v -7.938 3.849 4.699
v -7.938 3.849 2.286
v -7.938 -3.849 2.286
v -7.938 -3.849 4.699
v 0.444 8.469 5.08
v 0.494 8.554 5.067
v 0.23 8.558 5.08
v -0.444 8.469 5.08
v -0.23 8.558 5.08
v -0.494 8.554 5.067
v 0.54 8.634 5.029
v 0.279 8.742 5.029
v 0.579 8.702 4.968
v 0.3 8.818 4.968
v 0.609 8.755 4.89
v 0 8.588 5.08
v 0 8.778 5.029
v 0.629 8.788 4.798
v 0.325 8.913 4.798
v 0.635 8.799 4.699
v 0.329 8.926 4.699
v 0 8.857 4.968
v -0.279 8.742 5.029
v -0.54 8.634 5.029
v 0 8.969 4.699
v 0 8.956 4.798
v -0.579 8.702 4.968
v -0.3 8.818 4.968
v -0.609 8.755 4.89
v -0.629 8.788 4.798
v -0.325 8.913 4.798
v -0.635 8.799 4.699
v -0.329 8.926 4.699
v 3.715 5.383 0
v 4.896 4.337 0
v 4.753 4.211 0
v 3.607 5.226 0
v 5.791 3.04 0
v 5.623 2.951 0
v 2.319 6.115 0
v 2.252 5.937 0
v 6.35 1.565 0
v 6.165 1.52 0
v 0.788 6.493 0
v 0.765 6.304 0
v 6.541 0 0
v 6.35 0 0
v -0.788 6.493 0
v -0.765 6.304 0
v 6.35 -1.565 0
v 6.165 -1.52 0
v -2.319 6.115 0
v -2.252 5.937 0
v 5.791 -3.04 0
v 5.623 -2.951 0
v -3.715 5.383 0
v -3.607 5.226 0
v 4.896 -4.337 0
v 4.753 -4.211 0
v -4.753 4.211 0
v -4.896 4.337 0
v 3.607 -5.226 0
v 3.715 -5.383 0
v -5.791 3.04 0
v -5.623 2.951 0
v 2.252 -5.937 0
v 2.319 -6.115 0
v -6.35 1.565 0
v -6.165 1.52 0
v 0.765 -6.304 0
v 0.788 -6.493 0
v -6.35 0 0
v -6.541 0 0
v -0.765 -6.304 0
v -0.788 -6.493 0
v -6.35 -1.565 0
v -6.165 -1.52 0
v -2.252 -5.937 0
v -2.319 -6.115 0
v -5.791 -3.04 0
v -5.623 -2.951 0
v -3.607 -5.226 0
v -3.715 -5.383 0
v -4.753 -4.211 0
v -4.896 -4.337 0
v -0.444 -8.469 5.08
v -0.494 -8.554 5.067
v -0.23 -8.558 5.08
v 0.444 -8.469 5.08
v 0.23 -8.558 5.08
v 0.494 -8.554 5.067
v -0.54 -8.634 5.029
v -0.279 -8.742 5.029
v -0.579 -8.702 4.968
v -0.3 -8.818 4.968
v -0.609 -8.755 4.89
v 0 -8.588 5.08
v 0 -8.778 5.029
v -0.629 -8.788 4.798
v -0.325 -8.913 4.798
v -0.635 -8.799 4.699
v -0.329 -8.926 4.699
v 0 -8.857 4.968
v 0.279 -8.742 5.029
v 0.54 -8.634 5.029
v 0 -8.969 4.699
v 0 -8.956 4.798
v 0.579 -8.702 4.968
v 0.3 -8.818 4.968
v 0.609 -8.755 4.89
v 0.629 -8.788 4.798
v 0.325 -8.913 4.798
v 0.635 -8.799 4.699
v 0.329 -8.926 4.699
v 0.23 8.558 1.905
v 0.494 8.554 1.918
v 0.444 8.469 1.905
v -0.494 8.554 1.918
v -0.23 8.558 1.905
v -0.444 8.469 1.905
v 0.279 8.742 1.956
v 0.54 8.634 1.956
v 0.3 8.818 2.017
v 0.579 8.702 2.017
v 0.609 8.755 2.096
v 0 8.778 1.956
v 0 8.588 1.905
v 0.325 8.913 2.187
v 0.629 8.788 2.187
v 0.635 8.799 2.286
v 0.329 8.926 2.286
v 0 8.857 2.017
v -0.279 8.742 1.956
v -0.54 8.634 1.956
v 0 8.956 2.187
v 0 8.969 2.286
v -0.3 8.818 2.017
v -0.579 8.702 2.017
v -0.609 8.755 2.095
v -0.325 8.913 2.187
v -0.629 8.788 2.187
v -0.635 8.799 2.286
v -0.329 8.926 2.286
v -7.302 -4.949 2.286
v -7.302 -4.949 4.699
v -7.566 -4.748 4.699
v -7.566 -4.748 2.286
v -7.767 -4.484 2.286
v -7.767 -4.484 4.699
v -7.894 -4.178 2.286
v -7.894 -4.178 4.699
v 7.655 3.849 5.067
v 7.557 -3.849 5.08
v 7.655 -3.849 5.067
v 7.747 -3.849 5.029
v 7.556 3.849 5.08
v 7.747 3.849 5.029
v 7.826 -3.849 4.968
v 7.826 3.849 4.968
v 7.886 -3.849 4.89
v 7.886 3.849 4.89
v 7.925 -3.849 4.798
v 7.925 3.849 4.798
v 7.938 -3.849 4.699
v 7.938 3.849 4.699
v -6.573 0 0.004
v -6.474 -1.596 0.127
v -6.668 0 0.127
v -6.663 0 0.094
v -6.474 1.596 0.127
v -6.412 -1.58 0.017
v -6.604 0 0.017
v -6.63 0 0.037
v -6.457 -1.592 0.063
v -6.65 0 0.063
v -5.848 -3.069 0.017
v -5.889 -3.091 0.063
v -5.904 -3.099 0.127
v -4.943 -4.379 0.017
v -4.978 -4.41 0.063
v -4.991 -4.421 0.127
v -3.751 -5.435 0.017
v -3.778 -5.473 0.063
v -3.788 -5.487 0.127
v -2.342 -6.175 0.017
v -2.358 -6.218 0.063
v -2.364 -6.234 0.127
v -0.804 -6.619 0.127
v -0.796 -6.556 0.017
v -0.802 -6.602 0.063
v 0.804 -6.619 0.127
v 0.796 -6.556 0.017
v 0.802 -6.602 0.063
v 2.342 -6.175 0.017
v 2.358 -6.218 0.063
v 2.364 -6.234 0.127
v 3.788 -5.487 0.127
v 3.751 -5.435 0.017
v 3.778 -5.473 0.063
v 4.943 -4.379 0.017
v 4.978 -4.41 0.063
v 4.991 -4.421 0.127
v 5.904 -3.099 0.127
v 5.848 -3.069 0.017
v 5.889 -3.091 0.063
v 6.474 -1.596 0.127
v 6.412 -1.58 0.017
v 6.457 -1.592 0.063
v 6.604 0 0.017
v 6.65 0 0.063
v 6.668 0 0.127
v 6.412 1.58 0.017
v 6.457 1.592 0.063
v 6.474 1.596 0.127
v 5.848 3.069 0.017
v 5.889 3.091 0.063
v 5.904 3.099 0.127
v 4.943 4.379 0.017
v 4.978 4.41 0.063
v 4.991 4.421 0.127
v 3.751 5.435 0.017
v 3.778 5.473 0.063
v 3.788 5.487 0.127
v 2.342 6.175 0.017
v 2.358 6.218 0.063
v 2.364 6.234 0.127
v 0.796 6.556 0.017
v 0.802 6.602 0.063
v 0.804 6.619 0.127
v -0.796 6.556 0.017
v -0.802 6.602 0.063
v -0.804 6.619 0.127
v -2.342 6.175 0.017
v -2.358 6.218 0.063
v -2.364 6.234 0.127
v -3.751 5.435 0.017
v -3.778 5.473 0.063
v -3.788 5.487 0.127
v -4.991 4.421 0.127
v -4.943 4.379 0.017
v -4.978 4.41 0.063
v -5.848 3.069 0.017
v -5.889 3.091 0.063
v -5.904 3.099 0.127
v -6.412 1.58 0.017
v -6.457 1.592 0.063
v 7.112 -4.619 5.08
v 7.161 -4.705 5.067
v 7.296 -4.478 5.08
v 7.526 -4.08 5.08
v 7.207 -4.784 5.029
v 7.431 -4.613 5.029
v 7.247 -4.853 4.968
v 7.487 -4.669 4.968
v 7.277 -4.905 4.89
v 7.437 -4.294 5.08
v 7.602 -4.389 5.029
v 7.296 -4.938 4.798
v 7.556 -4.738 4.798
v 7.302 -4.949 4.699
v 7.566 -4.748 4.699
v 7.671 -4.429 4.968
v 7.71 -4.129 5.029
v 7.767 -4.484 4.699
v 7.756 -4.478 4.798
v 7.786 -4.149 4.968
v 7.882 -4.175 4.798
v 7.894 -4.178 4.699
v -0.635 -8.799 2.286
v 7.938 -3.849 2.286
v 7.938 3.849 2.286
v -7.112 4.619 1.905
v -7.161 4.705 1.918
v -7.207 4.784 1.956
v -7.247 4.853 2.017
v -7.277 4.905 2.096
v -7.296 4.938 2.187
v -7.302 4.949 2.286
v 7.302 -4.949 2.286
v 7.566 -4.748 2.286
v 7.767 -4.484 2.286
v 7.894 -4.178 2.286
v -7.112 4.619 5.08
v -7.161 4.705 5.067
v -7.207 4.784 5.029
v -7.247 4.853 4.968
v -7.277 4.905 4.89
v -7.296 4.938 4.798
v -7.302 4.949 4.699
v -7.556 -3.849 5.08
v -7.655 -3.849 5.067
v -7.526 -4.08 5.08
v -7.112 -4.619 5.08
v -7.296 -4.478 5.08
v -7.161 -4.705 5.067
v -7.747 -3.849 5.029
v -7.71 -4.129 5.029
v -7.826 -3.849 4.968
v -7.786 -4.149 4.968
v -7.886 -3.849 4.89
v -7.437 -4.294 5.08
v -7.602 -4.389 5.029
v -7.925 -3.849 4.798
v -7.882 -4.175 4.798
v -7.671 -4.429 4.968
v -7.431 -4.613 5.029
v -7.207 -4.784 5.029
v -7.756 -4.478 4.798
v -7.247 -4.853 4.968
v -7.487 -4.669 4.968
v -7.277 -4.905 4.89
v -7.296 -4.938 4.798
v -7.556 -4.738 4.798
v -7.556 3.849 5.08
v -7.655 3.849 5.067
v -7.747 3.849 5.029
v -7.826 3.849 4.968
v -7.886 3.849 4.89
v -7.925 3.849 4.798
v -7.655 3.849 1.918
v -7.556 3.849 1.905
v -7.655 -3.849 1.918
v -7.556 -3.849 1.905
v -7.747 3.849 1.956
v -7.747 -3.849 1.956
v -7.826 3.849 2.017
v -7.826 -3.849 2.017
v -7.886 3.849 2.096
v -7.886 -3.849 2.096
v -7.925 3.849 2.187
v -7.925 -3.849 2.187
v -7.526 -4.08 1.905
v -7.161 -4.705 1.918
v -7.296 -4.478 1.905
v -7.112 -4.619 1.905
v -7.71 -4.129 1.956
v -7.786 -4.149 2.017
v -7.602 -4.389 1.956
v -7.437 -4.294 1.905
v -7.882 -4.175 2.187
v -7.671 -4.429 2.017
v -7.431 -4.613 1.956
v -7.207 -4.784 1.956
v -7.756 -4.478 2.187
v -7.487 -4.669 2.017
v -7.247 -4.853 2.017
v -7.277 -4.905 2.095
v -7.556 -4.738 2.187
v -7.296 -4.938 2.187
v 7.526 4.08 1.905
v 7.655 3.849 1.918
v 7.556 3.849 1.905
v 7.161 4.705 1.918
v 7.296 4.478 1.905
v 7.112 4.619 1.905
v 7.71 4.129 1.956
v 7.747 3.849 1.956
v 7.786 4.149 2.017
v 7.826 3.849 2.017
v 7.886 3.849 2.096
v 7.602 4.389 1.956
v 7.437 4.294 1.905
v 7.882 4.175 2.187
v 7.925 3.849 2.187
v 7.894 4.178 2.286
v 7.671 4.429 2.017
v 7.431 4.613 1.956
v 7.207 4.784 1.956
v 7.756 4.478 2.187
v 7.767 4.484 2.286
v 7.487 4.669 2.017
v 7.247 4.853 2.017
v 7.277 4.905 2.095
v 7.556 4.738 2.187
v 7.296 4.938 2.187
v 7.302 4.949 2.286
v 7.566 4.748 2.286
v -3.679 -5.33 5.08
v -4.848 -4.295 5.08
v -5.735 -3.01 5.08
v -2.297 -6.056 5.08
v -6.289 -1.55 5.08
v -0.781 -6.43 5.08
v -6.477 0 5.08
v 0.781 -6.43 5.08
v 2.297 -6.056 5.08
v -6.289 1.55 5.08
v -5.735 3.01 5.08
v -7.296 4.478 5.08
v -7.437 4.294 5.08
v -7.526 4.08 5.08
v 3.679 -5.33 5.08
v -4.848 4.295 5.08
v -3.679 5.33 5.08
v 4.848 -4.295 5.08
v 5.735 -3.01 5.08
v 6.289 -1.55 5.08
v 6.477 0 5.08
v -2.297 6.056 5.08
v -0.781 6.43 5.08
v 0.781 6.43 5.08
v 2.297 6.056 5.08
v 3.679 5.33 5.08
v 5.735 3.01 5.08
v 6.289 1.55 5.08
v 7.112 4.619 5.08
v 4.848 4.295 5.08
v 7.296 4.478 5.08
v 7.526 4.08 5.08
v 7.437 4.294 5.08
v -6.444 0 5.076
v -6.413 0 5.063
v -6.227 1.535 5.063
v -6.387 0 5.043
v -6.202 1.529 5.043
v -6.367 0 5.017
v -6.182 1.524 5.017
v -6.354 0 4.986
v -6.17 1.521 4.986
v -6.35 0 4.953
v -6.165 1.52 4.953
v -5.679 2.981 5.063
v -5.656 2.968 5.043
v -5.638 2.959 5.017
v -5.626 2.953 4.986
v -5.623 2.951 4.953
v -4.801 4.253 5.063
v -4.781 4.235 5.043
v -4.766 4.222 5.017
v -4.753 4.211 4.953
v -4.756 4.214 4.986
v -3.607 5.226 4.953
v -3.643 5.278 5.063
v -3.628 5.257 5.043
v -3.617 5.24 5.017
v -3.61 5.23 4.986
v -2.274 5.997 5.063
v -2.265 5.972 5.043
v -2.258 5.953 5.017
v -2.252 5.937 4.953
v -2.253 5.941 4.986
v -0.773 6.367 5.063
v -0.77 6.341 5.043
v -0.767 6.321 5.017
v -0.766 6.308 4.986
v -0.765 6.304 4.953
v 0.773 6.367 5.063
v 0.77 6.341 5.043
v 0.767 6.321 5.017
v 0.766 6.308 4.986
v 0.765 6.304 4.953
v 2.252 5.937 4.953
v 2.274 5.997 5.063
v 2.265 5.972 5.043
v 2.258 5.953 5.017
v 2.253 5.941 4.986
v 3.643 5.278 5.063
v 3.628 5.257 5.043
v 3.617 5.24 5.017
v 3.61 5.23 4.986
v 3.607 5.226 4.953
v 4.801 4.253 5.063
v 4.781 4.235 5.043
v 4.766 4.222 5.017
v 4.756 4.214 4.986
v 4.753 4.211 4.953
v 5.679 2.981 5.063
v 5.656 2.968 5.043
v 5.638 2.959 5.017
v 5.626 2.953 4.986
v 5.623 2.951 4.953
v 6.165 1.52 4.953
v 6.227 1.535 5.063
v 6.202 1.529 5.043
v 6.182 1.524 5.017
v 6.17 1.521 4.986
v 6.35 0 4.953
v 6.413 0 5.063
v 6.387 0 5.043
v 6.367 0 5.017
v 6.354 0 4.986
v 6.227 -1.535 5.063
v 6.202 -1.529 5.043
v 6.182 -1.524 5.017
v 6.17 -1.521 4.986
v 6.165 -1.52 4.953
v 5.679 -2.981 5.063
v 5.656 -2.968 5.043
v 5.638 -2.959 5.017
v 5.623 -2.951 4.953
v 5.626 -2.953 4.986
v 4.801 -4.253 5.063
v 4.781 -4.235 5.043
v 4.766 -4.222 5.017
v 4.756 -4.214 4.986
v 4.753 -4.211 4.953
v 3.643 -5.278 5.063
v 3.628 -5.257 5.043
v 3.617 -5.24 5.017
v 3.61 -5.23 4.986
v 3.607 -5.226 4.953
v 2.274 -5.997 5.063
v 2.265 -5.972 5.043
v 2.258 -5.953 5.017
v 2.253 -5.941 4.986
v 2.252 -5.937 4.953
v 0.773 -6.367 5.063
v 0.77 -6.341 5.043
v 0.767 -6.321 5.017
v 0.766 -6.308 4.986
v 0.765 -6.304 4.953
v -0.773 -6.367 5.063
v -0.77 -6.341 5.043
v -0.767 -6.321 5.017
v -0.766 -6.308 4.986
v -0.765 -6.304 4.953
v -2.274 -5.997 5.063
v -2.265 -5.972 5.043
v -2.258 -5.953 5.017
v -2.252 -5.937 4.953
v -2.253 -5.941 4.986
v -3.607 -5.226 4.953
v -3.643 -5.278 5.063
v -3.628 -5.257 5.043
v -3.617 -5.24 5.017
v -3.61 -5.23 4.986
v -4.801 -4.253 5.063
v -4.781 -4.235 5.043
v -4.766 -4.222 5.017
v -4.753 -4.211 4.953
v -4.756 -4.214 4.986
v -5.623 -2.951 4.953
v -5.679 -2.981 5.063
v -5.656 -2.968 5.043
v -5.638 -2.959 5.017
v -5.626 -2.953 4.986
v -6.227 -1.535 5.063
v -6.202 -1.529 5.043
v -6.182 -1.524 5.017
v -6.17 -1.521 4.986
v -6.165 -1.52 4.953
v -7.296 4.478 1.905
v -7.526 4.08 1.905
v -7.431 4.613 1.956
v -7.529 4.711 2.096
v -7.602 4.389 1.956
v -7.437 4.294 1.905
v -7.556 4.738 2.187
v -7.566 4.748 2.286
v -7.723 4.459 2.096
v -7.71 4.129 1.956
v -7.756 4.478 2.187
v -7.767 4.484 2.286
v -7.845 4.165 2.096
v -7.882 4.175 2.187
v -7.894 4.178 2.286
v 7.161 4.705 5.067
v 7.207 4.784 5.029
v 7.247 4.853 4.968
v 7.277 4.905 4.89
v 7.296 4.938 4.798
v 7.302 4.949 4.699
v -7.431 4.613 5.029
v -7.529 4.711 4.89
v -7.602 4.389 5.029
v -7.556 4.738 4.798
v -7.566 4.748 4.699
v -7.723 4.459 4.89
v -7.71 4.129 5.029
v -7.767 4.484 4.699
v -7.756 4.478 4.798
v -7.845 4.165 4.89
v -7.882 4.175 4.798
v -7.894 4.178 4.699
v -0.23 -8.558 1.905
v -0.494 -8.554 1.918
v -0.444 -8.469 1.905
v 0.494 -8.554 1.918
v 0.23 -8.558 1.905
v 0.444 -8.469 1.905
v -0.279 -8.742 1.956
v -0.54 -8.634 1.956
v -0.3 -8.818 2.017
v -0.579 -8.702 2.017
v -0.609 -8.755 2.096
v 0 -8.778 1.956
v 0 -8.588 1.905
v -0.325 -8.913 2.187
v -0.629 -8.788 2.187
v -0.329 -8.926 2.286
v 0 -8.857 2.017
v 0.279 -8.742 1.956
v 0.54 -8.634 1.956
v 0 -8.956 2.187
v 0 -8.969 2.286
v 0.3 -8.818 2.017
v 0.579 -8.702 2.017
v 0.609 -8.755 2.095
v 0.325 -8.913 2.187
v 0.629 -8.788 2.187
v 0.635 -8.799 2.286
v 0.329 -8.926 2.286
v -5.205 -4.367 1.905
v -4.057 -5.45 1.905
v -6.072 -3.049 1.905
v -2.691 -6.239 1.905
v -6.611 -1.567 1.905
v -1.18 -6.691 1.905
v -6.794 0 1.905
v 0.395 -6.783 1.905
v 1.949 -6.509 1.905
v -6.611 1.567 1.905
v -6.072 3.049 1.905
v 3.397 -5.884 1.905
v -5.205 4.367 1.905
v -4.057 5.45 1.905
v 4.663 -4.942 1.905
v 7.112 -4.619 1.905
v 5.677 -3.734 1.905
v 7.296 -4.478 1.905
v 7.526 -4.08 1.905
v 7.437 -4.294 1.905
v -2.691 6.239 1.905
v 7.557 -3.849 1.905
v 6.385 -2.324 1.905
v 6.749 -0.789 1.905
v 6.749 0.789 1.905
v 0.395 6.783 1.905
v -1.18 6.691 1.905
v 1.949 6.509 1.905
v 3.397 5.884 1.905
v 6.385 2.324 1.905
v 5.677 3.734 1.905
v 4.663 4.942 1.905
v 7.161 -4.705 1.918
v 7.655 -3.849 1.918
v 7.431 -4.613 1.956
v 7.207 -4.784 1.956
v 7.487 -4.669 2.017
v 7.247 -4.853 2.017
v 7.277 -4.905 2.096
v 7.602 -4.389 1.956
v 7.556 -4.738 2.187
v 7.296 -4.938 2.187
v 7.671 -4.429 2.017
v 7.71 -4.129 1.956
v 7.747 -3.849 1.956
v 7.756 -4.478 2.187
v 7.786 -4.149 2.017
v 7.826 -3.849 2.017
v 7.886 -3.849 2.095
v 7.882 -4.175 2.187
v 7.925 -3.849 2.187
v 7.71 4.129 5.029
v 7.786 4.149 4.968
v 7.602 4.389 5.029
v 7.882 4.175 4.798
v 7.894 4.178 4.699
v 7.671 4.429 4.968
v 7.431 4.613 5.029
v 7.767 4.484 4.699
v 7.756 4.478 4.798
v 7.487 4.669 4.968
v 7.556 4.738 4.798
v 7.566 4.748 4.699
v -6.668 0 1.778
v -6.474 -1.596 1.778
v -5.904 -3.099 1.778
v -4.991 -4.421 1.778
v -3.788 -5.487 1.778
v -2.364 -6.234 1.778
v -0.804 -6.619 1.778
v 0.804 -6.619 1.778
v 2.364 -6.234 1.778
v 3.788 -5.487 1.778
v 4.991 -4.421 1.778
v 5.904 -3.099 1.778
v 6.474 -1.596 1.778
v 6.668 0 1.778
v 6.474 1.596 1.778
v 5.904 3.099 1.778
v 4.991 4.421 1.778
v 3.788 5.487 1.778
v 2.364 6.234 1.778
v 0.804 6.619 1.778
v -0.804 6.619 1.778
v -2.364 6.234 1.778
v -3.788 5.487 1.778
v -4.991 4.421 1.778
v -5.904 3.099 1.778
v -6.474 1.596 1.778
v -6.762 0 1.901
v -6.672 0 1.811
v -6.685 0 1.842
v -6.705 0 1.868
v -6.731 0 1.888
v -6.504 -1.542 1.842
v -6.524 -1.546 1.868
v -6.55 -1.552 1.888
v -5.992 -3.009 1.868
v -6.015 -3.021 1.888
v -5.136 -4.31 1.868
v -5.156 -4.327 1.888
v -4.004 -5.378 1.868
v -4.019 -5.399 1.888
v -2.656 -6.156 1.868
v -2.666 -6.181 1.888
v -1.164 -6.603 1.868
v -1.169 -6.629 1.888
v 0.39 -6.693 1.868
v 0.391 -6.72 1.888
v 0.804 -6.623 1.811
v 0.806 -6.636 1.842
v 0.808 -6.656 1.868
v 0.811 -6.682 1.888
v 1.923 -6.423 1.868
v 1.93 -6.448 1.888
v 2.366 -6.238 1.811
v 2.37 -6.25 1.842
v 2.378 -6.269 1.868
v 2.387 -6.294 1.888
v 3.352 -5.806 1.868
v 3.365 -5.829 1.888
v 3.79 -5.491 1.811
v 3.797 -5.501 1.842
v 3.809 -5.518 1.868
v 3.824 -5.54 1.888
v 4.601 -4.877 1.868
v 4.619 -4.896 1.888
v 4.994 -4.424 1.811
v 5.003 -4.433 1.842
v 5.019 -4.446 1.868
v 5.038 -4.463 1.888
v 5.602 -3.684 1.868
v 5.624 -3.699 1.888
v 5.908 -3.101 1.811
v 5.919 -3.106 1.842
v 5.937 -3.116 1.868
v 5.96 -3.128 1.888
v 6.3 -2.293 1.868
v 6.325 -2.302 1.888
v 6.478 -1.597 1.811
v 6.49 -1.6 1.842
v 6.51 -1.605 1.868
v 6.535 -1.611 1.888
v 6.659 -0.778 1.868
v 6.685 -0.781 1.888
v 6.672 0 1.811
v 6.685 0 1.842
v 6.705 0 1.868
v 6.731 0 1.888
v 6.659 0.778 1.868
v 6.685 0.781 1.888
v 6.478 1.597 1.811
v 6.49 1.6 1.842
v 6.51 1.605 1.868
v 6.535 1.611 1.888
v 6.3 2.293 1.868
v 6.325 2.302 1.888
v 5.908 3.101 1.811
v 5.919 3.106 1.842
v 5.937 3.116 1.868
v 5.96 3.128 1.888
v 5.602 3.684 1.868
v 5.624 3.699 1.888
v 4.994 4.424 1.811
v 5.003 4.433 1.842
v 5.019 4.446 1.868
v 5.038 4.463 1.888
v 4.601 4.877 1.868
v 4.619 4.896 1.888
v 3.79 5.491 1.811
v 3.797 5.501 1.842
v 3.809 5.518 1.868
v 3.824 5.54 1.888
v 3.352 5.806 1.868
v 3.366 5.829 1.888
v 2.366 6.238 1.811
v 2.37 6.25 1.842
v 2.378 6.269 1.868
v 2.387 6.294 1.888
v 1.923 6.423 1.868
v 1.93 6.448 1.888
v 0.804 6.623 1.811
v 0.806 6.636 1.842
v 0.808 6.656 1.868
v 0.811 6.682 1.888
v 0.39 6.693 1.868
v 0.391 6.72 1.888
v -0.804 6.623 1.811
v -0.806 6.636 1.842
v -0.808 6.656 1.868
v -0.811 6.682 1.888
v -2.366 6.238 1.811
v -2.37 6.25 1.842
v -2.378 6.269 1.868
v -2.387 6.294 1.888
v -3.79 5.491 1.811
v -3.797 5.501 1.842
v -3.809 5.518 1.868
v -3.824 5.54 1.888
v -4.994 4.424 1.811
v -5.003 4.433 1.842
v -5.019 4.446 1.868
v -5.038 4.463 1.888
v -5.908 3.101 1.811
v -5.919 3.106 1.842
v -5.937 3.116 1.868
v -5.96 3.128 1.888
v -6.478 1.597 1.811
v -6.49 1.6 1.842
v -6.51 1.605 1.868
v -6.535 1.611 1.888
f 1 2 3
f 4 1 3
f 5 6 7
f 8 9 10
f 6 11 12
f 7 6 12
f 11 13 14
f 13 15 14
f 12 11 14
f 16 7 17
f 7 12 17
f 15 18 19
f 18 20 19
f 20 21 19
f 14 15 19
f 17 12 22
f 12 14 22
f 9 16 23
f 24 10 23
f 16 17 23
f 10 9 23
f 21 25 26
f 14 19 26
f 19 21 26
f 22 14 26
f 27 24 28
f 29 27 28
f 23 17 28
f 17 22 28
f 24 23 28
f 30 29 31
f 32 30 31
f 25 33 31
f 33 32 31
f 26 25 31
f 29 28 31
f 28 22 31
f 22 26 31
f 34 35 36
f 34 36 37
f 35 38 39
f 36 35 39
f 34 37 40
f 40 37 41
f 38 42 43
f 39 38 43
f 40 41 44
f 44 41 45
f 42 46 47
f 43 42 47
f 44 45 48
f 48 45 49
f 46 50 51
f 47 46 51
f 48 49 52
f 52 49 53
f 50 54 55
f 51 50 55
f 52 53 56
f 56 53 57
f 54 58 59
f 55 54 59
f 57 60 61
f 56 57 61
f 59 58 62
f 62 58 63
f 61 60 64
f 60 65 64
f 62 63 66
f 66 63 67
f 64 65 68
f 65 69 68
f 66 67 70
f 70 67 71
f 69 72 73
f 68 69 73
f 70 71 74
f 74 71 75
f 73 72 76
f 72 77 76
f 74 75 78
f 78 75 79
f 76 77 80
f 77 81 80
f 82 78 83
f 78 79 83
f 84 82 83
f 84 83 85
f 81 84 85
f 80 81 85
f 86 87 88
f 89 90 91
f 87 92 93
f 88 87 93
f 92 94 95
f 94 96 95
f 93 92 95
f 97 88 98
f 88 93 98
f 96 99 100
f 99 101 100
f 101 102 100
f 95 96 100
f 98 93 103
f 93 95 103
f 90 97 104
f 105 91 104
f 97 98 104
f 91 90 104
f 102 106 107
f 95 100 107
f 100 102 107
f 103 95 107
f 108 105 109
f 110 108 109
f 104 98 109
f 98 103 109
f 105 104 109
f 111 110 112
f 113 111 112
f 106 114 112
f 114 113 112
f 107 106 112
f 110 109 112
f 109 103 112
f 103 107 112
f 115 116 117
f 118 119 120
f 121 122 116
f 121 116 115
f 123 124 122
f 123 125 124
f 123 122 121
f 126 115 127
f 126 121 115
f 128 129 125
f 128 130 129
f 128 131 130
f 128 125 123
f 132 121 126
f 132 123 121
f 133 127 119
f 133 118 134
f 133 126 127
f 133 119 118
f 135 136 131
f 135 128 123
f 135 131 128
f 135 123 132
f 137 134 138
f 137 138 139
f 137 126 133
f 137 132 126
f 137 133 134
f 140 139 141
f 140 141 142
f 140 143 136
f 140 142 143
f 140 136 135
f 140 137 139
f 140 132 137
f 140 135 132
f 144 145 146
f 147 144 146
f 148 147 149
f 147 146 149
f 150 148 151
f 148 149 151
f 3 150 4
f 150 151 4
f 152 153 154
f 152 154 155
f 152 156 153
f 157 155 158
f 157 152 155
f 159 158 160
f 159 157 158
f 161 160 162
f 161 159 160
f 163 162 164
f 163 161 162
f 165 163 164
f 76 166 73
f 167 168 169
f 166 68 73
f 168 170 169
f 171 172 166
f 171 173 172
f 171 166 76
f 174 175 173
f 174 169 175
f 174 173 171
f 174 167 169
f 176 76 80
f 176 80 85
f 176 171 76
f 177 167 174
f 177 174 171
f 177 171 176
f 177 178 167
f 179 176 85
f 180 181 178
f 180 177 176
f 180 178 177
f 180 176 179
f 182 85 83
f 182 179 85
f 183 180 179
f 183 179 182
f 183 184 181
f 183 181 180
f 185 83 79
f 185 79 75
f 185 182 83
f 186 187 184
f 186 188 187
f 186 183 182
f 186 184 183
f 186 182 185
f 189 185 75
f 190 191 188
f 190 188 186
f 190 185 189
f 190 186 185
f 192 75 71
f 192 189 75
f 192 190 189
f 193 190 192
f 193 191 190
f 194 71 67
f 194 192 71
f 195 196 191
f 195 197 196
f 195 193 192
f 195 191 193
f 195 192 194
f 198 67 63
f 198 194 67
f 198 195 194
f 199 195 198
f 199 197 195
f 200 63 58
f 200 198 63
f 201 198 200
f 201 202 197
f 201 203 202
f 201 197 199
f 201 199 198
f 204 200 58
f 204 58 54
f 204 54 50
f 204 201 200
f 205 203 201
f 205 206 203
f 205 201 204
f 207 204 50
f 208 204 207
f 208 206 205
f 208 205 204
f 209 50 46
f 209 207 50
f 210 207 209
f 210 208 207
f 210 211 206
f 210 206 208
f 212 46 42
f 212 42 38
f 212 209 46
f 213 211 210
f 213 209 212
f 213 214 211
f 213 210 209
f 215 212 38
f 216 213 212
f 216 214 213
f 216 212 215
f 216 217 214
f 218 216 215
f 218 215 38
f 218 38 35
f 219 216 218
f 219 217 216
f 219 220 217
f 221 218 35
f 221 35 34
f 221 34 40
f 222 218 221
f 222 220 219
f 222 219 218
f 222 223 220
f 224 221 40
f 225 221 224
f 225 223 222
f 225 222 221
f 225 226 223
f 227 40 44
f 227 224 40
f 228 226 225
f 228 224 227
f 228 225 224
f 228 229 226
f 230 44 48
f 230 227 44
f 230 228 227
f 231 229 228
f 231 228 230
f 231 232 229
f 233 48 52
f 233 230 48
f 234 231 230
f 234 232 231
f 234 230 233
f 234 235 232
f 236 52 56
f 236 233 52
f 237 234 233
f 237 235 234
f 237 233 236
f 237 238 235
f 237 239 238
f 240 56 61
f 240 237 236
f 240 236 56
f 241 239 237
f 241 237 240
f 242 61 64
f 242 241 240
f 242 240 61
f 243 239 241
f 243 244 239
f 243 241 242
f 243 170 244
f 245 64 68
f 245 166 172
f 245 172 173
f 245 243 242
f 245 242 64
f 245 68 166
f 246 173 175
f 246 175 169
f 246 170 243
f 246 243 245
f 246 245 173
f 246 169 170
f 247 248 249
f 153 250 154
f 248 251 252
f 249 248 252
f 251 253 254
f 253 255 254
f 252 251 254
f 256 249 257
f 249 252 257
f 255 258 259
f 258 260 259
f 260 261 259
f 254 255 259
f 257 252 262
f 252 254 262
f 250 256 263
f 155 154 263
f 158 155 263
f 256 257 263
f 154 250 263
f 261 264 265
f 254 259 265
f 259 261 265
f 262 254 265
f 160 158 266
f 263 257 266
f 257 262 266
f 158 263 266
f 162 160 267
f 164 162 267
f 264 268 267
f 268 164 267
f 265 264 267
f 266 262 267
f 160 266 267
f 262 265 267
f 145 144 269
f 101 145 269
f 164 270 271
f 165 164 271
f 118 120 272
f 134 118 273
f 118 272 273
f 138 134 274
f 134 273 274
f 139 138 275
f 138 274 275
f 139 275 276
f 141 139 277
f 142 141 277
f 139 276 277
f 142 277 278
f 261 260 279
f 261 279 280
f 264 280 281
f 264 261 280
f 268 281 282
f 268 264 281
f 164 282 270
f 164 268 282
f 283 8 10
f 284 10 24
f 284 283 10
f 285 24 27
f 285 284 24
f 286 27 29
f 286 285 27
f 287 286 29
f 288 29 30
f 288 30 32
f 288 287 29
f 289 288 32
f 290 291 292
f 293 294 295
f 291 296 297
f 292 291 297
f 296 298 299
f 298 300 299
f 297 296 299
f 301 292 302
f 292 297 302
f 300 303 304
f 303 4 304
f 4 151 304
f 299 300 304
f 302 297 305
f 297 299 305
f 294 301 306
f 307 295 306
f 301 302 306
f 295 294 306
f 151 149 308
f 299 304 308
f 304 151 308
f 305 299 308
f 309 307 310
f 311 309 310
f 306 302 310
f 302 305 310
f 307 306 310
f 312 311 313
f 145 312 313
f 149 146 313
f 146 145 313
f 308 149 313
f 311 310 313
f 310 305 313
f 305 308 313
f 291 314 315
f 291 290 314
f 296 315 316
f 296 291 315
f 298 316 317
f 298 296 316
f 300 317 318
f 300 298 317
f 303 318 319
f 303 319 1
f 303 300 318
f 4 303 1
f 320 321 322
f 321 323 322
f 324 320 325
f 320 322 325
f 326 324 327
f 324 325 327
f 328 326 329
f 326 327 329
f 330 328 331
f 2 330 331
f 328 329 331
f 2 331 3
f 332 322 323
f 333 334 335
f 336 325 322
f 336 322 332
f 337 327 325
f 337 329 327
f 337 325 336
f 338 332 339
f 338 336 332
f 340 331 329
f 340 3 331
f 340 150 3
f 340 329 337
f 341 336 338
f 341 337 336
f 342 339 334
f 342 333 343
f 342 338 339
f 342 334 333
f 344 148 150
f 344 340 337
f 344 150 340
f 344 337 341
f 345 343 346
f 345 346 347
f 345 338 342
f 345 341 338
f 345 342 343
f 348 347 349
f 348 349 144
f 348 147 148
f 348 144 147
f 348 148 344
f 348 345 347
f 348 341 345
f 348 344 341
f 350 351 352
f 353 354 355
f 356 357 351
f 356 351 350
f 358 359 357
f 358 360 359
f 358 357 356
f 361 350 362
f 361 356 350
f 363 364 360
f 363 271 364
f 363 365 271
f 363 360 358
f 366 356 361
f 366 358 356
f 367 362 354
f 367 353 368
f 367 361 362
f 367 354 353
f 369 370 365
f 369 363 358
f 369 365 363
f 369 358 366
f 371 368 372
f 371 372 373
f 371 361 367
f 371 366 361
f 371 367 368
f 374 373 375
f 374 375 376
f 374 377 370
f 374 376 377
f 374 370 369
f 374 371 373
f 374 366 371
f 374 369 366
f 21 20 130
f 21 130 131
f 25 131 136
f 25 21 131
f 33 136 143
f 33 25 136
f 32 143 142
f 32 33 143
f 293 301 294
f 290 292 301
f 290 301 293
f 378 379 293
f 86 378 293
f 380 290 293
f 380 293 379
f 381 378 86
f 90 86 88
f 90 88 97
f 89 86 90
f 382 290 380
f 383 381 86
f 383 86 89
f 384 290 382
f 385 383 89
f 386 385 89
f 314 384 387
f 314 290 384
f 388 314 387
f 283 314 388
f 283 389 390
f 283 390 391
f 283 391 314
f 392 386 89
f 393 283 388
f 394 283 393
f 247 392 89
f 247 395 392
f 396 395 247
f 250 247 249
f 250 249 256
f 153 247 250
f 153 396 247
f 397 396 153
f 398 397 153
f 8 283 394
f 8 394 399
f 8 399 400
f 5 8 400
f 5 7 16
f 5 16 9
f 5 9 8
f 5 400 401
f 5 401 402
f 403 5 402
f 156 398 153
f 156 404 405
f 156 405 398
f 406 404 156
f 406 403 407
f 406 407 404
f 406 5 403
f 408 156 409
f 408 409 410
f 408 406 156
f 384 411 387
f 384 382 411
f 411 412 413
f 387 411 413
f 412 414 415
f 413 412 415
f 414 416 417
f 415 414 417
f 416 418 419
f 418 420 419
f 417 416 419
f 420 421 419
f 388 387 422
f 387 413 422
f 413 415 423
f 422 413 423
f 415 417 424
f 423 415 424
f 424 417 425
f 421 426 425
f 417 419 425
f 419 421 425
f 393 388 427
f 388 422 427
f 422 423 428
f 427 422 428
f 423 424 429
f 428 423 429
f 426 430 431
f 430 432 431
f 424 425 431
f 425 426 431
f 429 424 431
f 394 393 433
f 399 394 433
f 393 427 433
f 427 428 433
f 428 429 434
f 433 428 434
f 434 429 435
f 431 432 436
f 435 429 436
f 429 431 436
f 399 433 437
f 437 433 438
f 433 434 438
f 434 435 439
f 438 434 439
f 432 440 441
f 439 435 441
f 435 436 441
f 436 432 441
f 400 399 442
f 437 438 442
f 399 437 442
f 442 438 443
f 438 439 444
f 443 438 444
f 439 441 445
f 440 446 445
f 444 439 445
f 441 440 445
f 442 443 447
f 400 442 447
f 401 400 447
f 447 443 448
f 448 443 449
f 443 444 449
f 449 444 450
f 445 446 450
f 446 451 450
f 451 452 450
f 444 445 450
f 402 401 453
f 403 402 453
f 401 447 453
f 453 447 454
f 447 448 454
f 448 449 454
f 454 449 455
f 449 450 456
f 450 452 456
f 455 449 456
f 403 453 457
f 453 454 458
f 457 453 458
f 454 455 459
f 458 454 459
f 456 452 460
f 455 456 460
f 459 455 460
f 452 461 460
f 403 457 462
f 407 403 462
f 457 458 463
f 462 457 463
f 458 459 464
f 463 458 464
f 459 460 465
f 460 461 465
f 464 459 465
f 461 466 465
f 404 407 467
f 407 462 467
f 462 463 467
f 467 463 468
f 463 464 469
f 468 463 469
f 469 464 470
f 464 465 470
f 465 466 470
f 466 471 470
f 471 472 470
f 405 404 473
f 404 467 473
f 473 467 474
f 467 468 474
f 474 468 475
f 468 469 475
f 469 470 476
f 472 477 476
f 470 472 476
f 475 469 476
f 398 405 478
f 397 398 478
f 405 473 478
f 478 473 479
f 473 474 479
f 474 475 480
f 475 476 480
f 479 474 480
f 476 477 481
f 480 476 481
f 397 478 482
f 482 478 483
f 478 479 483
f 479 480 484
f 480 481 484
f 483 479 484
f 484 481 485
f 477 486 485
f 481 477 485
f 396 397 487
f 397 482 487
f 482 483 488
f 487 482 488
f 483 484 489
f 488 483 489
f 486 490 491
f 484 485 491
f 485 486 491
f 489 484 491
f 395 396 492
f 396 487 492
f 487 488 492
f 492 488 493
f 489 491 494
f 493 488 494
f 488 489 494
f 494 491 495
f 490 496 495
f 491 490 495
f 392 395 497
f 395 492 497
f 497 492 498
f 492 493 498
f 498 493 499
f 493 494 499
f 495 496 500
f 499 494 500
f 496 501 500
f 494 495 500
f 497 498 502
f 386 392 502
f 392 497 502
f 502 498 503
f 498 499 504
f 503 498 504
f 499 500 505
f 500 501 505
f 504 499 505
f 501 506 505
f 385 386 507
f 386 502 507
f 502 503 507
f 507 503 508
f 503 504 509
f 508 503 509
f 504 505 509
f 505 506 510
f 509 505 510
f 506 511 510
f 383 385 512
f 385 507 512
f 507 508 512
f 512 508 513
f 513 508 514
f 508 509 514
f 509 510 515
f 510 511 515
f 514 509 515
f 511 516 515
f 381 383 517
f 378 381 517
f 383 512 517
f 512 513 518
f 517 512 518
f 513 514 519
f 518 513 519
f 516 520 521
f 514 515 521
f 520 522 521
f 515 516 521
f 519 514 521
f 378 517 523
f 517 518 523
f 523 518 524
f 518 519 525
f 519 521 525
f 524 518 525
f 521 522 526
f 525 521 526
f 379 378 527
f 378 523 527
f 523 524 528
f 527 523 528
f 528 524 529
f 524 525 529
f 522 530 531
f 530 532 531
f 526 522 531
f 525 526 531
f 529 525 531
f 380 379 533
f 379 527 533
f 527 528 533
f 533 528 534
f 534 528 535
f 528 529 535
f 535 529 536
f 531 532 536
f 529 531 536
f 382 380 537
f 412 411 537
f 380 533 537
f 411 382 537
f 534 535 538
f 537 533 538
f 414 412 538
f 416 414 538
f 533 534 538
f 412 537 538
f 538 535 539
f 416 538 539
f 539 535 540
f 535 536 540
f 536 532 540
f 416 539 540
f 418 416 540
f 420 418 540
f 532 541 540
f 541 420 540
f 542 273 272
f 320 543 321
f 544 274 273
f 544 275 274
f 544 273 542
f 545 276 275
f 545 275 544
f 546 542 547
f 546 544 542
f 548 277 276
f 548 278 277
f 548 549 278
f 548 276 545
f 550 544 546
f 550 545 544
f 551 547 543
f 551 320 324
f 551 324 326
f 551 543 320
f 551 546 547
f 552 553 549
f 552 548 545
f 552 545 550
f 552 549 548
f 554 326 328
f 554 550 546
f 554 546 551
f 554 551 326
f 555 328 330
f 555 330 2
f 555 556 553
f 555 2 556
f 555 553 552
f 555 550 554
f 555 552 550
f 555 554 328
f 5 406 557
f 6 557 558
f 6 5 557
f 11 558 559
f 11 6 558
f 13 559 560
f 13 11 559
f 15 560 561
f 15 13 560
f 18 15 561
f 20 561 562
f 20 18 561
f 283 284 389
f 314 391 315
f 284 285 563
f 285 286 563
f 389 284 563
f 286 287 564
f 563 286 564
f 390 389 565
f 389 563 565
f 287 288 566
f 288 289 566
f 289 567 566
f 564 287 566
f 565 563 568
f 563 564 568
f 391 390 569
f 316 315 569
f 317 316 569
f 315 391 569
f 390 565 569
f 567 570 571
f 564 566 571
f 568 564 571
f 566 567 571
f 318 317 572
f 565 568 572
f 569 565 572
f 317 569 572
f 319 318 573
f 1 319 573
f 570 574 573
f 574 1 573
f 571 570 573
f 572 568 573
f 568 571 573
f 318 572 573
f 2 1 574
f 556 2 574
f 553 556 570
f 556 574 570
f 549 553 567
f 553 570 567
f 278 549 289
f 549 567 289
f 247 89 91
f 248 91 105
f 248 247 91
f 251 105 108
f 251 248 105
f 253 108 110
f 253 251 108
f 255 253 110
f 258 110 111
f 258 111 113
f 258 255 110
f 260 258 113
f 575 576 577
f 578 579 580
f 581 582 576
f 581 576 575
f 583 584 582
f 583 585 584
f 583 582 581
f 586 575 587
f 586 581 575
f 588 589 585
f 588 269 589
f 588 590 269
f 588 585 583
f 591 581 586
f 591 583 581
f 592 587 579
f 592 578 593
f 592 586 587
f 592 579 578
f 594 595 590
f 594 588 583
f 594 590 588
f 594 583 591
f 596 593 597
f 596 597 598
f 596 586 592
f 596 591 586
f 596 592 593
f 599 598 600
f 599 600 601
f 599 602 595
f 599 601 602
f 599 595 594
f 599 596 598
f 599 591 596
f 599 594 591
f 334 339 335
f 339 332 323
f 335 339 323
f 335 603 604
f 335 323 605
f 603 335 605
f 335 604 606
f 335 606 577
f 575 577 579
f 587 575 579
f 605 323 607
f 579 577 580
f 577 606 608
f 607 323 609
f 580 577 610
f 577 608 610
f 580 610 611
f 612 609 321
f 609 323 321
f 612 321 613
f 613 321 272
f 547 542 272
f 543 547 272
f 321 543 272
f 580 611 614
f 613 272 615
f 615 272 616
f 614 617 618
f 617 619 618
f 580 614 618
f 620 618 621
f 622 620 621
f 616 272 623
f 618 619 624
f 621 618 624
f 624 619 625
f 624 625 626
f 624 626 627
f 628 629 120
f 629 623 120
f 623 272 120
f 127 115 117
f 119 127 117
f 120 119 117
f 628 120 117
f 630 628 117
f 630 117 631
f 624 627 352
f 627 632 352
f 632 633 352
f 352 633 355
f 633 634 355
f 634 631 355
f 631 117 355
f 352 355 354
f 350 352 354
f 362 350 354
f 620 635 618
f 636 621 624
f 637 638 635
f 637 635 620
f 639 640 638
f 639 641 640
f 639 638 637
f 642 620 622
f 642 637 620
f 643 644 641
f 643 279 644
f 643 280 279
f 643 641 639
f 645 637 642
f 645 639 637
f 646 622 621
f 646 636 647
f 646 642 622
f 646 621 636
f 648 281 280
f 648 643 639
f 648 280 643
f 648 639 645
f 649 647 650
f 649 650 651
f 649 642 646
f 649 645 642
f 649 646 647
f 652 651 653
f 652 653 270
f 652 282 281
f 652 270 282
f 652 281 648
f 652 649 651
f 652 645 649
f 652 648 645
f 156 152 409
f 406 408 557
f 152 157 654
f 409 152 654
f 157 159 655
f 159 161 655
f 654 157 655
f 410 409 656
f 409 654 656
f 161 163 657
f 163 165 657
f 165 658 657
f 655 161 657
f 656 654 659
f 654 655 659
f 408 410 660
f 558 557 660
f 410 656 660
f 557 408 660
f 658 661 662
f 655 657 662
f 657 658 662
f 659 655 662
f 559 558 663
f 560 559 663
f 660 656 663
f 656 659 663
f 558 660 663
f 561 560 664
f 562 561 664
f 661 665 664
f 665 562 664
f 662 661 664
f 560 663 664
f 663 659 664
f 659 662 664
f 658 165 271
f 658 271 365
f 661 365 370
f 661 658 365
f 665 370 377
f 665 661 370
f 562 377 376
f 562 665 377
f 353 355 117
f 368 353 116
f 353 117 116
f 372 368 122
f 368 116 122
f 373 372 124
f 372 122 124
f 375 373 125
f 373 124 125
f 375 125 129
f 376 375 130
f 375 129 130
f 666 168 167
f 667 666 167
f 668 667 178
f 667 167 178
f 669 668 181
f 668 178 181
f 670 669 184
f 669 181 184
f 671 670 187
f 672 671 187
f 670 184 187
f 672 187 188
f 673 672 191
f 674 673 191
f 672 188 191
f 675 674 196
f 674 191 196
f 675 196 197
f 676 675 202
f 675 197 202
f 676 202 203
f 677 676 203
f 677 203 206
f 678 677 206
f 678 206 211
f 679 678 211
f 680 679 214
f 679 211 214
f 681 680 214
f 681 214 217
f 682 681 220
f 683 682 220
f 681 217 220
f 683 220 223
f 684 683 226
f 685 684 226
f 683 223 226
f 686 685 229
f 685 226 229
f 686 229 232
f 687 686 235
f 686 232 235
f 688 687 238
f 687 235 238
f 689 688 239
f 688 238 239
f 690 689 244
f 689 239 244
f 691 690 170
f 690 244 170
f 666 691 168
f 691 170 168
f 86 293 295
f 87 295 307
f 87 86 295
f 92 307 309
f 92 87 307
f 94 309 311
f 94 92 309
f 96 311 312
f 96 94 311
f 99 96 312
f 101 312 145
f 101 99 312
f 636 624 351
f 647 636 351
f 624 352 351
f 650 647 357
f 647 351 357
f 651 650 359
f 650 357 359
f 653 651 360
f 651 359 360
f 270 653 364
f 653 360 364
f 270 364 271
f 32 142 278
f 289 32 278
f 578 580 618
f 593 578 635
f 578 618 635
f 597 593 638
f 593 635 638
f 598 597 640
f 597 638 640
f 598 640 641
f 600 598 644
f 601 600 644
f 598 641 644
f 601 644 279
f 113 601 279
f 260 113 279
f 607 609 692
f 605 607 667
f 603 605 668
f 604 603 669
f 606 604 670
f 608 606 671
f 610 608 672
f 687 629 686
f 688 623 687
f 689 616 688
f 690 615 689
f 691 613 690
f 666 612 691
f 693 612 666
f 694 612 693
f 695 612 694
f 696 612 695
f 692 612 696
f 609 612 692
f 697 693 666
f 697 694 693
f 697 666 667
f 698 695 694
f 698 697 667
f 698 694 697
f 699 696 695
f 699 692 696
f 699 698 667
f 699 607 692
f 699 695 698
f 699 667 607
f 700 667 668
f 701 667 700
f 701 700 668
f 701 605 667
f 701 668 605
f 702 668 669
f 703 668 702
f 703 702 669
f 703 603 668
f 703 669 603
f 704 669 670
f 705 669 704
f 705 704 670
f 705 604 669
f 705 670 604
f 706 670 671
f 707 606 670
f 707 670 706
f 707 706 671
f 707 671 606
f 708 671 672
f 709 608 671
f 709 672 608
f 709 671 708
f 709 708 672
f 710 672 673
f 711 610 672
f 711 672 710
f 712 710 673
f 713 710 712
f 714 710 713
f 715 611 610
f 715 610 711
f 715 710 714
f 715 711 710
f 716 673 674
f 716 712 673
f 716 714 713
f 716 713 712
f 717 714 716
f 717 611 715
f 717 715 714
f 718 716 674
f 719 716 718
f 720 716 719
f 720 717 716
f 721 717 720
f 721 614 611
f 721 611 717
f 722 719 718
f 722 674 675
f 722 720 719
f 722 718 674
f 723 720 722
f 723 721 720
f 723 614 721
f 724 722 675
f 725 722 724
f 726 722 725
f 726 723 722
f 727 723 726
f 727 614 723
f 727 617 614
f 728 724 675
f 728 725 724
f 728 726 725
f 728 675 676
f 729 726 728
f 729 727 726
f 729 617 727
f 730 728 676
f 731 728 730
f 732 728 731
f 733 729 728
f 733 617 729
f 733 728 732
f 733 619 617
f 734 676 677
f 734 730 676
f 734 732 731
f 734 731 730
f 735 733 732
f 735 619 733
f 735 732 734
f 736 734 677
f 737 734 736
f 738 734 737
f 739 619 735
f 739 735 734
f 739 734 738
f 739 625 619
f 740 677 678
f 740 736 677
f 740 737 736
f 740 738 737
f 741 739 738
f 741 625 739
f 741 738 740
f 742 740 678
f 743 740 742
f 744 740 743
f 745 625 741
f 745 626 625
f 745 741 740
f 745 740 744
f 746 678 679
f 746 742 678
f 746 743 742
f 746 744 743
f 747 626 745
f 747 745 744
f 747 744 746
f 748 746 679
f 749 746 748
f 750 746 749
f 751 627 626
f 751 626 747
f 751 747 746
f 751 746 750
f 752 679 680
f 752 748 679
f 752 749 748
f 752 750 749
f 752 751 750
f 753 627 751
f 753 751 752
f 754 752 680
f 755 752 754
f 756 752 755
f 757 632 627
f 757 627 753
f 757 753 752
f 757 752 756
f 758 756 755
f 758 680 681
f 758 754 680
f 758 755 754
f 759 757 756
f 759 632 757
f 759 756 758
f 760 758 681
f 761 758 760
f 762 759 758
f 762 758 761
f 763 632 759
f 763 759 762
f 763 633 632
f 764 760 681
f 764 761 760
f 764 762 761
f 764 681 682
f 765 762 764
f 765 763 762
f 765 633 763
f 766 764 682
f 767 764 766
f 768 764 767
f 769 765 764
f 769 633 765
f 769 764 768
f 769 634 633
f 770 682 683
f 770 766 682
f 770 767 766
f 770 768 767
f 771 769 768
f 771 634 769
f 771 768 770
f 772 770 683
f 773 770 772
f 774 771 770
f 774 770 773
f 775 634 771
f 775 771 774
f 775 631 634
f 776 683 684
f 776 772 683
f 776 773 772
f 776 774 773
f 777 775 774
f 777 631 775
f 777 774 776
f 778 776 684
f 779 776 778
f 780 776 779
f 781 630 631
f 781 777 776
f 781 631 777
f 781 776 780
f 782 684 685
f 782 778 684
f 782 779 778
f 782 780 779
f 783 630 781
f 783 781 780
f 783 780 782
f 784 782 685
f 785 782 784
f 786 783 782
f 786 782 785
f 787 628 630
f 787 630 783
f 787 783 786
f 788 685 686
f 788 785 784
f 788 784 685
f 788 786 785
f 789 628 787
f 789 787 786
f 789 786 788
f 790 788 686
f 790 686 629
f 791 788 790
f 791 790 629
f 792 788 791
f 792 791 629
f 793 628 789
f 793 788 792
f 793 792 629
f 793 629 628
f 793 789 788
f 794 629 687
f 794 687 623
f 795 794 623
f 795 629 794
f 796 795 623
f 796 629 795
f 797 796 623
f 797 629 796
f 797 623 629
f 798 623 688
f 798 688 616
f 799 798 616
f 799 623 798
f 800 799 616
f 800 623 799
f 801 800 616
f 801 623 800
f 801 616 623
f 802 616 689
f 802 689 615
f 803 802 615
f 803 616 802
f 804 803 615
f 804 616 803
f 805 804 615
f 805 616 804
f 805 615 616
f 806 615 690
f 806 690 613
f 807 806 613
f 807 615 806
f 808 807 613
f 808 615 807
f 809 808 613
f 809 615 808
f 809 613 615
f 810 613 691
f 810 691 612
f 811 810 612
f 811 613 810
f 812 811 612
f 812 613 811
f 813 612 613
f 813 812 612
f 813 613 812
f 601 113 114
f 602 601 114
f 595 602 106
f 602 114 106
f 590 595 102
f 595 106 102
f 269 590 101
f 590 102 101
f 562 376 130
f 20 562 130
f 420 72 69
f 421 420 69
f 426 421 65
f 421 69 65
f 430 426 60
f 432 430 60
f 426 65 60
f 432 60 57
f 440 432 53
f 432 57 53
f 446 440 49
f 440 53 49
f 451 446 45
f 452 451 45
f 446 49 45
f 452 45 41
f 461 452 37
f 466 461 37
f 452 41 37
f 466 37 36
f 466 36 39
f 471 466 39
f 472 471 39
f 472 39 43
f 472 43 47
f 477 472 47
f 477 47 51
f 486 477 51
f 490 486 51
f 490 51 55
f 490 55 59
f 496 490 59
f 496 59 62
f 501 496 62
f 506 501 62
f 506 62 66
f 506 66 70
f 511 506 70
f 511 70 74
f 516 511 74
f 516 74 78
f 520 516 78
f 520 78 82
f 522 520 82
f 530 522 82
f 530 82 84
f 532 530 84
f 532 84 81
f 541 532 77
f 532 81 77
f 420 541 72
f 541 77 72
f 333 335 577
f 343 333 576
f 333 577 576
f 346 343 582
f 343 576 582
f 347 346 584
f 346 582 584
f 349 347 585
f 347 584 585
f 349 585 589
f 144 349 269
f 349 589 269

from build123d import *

# Parameters (mm, degrees)
SKETCH1_R           = 6.6675
BOSS_EXTRUDE1_DEPTH = 1.905
BOSS_EXTRUDE2_DEPTH = 3.175
SKETCH3_R           = 6.35
CUT_EXTRUDE1_DEPTH  = 14.145931484
FILLET1_R           = 1.27
FILLET2_R           = 0.381
FILLET3_R           = 0.381
FILLET4_R           = 0.127
FILLET5_R           = 0.127


with BuildPart() as part:
    # Sketch1 → Boss-Extrude1 (new body)
    with BuildSketch(Plane.XY):
        with Locations(Location((0, 0, 0), (0, 0, 180))):
            Circle(SKETCH1_R)
    extrude(amount=BOSS_EXTRUDE1_DEPTH)

    # Sketch2 → Boss-Extrude2 (add)
    with BuildSketch(Plane.XY.offset(1.905)):
        Polygon((0, -9.165435523), (7.9375, -4.582717762), (7.9375, 4.582717762), (0, 9.165435523), (-7.9375, 4.582717762), (-7.9375, -4.582717762), align=None)
    extrude(amount=BOSS_EXTRUDE2_DEPTH)

    # Sketch3 → Cut-Extrude1 (cut, through all)
    with BuildSketch(Plane(origin=(0, 0, 0), x_dir=(-1, 0, 0), z_dir=(0, 0, -1))):
        Circle(SKETCH3_R)
    extrude(amount=-CUT_EXTRUDE1_DEPTH, mode=Mode.SUBTRACT)

    # Fillet1
    fillet1_edges = [part.edges().sort_by_distance(p)[0] for p in [
        (-7.9375, -4.582717762, 3.4925),
        (0, -9.165435523, 3.4925),
        (7.9375, -4.582717762, 3.4925),
        (7.9375, 4.582717762, 3.4925),
        (0, 9.165435523, 3.4925),
        (-7.9375, 4.582717762, 3.4925),
    ]]
    fillet(fillet1_edges, radius=FILLET1_R)

    # Fillet2
    fillet2_edges = [part.edges().sort_by_distance(p)[0] for p in [
        (-7.9375, 0, 1.905),
        (-3.96875, -6.874076643, 1.905),
        (-3.96875, 6.874076643, 1.905),
        (3.96875, 6.874076643, 1.905),
        (7.9375, 0, 1.905),
        (3.96875, -6.874076643, 1.905),
        (0, 8.96896584, 1.905),
        (7.767352263, 4.48448292, 1.905),
        (7.767352263, -4.48448292, 1.905),
        (0, -8.96896584, 1.905),
        (-7.767352263, -4.48448292, 1.905),
        (-7.767352263, 4.48448292, 1.905),
    ]]
    fillet(fillet2_edges, radius=FILLET2_R)

    # Fillet3
    fillet3_edges = [part.edges().sort_by_distance(p)[0] for p in [
        (-7.9375, 0, 5.08),
        (-3.96875, 6.874076643, 5.08),
        (-3.96875, -6.874076643, 5.08),
        (3.96875, -6.874076643, 5.08),
        (7.9375, 0, 5.08),
        (3.96875, 6.874076643, 5.08),
        (0, 8.96896584, 5.08),
        (7.767352263, 4.48448292, 5.08),
        (7.767352263, -4.48448292, 5.08),
        (0, -8.96896584, 5.08),
        (-7.767352263, -4.48448292, 5.08),
        (-7.767352263, 4.48448292, 5.08),
    ]]
    fillet(fillet3_edges, radius=FILLET3_R)

    # Fillet4
    fillet4_edges = [part.edges().sort_by_distance(p)[0] for p in [
        (6.35, 0, 5.08),
    ]]
    fillet(fillet4_edges, radius=FILLET4_R)

    # Fillet5
    fillet5_edges = [part.edges().sort_by_distance(p)[0] for p in [
        (6.6675, 0, 0),
        (6.6675, 0, 1.905),
    ]]
    fillet(fillet5_edges, radius=FILLET5_R)


solid = part.part
